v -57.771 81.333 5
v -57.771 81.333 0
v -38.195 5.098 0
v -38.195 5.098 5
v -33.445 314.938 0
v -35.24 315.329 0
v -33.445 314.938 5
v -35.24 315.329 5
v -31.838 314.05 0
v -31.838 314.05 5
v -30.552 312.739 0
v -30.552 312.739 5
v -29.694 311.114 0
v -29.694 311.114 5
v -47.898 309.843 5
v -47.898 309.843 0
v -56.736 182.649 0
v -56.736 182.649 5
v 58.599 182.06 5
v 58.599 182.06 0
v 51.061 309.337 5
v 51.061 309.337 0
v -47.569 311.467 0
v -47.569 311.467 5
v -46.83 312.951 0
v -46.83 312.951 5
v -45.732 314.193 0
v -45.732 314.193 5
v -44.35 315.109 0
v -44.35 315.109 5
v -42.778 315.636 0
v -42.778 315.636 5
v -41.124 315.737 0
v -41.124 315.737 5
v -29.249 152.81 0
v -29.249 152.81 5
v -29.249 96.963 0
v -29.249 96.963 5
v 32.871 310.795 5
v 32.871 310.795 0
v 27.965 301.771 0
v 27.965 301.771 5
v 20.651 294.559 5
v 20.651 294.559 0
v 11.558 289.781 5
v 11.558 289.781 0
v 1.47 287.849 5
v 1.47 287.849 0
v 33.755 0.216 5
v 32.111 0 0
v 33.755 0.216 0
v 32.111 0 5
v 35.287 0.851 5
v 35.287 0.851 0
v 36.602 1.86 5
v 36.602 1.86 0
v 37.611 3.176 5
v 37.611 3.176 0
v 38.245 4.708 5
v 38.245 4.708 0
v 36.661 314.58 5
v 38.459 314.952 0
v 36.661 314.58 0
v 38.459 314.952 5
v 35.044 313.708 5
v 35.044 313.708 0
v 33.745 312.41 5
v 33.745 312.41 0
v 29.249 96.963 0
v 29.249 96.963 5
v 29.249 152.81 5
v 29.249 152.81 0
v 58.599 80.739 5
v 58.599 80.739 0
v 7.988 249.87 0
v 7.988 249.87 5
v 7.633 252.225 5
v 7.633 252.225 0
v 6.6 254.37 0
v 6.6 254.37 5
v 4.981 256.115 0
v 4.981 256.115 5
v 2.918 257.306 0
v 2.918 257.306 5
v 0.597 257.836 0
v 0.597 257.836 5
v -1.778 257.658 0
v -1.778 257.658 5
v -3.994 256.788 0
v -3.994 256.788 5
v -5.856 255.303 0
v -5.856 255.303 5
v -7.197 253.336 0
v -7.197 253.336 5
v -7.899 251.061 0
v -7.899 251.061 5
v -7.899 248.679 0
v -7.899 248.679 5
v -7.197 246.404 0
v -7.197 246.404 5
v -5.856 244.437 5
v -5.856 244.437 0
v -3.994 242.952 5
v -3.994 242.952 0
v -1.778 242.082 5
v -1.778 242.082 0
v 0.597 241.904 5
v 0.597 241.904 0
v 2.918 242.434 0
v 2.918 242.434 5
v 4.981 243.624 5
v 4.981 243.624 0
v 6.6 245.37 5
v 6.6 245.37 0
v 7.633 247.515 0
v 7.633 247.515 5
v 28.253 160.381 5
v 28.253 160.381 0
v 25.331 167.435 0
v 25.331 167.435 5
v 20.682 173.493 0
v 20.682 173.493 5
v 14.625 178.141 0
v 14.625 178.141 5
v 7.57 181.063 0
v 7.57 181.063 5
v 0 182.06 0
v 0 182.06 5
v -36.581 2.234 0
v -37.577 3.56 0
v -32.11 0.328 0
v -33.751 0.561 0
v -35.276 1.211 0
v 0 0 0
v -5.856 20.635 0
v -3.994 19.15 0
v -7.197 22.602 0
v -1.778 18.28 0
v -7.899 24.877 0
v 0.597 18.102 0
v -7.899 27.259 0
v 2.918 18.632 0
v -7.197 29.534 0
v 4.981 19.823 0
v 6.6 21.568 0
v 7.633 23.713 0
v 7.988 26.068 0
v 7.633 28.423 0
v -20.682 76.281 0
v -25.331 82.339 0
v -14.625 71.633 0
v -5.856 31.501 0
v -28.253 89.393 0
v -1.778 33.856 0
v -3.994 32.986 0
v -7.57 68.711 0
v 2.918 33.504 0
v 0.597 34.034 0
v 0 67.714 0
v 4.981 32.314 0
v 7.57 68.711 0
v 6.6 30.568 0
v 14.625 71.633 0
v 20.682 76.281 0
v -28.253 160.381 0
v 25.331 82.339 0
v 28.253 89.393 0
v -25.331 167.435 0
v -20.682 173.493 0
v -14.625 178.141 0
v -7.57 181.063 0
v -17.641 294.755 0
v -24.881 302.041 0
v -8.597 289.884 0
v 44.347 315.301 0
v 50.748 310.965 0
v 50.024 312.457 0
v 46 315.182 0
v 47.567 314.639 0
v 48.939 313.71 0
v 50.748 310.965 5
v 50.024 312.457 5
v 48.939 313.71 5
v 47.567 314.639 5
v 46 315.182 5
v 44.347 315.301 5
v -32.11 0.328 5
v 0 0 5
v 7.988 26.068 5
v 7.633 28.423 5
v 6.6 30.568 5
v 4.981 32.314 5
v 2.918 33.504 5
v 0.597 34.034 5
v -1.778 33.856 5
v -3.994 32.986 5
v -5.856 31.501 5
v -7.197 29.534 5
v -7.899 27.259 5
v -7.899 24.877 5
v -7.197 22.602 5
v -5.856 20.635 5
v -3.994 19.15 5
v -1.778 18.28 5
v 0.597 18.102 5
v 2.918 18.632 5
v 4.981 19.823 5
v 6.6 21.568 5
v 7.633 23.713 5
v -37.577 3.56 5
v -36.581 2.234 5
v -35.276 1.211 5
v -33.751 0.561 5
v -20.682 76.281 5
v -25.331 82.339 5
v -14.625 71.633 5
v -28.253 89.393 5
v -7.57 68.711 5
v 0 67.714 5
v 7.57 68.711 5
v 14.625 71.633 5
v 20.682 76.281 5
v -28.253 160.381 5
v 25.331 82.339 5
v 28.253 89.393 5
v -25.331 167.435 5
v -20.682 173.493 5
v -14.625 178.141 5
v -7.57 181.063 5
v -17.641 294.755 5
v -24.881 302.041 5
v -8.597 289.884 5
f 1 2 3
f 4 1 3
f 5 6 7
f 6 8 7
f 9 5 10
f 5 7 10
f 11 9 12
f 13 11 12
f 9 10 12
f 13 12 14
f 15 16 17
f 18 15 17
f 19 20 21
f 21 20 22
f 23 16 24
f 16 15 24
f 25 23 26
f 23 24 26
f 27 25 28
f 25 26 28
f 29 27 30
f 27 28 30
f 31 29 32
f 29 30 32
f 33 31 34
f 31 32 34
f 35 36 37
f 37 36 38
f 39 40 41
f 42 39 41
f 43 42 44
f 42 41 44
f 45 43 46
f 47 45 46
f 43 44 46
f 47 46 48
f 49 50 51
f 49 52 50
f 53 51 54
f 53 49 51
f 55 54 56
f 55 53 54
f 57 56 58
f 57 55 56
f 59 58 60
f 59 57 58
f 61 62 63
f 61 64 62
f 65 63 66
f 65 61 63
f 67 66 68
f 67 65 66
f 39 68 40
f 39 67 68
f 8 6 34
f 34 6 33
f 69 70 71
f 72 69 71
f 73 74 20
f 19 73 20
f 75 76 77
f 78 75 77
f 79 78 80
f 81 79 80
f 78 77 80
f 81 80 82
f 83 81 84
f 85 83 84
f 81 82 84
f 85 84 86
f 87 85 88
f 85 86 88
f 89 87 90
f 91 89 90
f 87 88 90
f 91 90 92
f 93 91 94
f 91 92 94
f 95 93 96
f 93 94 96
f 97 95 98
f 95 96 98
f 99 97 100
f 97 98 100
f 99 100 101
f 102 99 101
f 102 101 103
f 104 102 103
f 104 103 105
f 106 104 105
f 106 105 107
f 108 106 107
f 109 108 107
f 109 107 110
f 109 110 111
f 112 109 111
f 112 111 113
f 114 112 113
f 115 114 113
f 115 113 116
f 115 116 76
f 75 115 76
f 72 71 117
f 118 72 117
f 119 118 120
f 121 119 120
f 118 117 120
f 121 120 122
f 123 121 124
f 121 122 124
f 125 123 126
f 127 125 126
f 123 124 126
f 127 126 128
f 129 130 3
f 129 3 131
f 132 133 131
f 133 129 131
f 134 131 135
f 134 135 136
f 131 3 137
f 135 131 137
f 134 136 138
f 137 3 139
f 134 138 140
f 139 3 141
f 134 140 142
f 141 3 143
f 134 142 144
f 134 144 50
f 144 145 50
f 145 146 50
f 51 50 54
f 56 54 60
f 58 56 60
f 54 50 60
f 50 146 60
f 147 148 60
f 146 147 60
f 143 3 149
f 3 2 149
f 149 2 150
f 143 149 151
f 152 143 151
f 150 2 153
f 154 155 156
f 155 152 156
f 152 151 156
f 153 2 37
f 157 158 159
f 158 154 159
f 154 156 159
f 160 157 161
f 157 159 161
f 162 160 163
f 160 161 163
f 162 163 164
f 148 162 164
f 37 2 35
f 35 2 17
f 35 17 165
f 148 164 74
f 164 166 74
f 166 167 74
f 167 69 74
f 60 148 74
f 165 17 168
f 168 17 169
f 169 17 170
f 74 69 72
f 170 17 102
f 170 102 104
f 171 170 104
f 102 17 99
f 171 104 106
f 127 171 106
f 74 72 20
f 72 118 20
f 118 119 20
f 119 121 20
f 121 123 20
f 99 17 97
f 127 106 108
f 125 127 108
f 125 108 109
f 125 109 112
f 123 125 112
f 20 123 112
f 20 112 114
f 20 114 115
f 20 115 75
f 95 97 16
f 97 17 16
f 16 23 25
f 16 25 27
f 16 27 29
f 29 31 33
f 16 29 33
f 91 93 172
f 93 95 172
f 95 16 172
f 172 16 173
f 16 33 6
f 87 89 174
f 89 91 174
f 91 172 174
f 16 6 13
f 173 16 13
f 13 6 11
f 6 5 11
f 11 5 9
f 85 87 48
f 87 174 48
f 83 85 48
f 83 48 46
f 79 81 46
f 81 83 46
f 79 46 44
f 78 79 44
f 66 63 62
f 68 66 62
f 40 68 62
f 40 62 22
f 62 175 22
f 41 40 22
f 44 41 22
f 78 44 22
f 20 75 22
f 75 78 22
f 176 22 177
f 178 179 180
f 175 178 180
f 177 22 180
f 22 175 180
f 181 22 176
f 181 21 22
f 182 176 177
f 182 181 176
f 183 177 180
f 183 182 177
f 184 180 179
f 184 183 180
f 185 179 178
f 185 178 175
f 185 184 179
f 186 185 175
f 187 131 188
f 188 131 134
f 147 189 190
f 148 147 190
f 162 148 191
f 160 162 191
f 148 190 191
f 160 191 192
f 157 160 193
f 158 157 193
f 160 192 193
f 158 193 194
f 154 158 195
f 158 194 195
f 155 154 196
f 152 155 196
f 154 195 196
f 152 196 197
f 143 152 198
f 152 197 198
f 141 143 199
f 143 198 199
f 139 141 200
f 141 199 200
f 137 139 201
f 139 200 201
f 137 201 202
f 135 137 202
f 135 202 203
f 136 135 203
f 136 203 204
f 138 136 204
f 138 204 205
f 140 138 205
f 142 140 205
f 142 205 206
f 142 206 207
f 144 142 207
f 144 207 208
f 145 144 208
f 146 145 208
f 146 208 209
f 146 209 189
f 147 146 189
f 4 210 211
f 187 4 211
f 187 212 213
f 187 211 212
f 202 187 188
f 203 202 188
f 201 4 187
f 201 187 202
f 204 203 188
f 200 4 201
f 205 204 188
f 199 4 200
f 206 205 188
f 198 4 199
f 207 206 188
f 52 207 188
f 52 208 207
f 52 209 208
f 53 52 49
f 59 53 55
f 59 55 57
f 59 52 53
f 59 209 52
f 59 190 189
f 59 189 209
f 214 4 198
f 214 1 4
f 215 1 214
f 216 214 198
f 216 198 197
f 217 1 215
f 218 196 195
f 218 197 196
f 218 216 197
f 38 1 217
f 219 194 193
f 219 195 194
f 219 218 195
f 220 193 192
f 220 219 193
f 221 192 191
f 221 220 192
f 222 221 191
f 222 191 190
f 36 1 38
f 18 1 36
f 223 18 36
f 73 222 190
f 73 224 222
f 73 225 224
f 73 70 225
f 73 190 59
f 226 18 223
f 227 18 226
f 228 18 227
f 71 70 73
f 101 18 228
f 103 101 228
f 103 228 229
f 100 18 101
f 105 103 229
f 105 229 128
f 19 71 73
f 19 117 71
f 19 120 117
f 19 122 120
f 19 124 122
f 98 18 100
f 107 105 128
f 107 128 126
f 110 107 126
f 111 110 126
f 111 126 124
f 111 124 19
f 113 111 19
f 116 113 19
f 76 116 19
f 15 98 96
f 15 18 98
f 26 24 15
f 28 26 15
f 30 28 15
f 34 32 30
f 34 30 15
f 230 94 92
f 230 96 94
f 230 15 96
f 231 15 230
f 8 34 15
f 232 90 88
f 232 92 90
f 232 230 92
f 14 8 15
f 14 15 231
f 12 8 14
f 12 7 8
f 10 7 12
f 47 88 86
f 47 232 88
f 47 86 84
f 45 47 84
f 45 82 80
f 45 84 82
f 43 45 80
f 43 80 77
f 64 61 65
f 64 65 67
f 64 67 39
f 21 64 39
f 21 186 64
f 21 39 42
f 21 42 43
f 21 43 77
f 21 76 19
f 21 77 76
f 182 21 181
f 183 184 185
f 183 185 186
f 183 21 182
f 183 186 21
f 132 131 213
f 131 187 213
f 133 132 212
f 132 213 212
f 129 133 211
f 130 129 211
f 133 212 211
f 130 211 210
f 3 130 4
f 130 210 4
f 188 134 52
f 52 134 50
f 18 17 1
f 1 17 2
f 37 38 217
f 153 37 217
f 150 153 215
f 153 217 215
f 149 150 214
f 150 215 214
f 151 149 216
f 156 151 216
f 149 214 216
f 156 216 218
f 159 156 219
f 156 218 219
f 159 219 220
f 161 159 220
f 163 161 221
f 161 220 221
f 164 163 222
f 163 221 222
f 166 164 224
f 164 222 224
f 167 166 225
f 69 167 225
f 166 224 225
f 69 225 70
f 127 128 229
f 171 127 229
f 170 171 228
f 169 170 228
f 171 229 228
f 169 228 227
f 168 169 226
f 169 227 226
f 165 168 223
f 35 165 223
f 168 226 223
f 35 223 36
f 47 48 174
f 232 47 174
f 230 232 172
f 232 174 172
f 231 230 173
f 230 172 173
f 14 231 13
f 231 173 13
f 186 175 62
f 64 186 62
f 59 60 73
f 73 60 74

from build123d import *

# Parameters (mm, degrees)
F1_DEPTH = 5
F2_R     = 7.9883
F3_DEPTH = 25.4
F6_DEPTH = 25.4
F7_R     = 6.35


with BuildPart() as f1:
    # F0 (on Top) → F1 (new body)
    with BuildSketch(Plane.XY):
        with BuildLine():
            Line((1.470284, 287.84881), (0, 0))
            Line((0, 0), (36.98494, 0))
            Line((36.98494, 0), (58.59907, 80.73898))
            Line((58.59907, 80.73898), (58.59907, 182.05958))
            Line((58.59907, 182.05958), (50.6857, 315.67628))
            Line((50.6857, 315.67628), (34.044278, 314.690702))
            ThreePointArc((34.044278, 314.690702), (22.258545, 295.807244), (1.470284, 287.84881))
        make_face()
        with BuildLine():
            Line((-36.98301, 0.377816), (0, 0))
            Line((0, 0), (1.470284, 287.84881))
            ThreePointArc((1.470284, 287.84881), (-19.235594, 296.019189), (-30.82781, 315.022057))
            Line((-30.82781, 315.022057), (-47.458296, 316.177583))
            Line((-47.458296, 316.177583), (-56.736201, 182.648693))
            Line((-56.736201, 182.648693), (-57.771231, 81.33338))
            Line((-57.771231, 81.33338), (-36.98301, 0.377816))
        make_face()
    extrude(amount=F1_DEPTH)

    # F2 (on face) → F3 (cut)
    with BuildSketch(Plane.XY.offset(5)):
        with Locations((0, 249.86996)):
            Circle(F2_R)
        with Locations((0, 26.06802)):
            Circle(F2_R)
    extrude(amount=-F3_DEPTH, mode=Mode.SUBTRACT)

    # F5 (on face) → F6 (cut)
    with BuildSketch(Plane.XY.offset(5)):
        with BuildLine():
            ThreePointArc((-29.24937, 96.96323), (-20.682428, 76.280802), (0, 67.71386))
            ThreePointArc((0, 67.71386), (20.682428, 76.280802), (29.24937, 96.96323))
            Line((29.24937, 96.96323), (29.24937, 152.81021))
            ThreePointArc((29.24937, 152.81021), (20.682428, 173.492638), (0, 182.05958))
            ThreePointArc((0, 182.05958), (-20.682428, 173.492638), (-29.24937, 152.81021))
            Line((-29.24937, 152.81021), (-29.24937, 96.96323))
        make_face()
    extrude(amount=-F6_DEPTH, mode=Mode.SUBTRACT)

    # F7
    f7_edges = [f1.edges().sort_by_distance(p)[0] for p in [
        (-36.98301, 0.377816, 2.5),
        (36.98494, 0, 2.5),
        (50.6857, 315.67628, 2.5),
        (34.044278, 314.690702, 2.5),
        (-30.82781, 315.022057, 2.5),
        (-47.458296, 316.177583, 2.5),
    ]]
    fillet(f7_edges, radius=F7_R)


solid = f1.part
